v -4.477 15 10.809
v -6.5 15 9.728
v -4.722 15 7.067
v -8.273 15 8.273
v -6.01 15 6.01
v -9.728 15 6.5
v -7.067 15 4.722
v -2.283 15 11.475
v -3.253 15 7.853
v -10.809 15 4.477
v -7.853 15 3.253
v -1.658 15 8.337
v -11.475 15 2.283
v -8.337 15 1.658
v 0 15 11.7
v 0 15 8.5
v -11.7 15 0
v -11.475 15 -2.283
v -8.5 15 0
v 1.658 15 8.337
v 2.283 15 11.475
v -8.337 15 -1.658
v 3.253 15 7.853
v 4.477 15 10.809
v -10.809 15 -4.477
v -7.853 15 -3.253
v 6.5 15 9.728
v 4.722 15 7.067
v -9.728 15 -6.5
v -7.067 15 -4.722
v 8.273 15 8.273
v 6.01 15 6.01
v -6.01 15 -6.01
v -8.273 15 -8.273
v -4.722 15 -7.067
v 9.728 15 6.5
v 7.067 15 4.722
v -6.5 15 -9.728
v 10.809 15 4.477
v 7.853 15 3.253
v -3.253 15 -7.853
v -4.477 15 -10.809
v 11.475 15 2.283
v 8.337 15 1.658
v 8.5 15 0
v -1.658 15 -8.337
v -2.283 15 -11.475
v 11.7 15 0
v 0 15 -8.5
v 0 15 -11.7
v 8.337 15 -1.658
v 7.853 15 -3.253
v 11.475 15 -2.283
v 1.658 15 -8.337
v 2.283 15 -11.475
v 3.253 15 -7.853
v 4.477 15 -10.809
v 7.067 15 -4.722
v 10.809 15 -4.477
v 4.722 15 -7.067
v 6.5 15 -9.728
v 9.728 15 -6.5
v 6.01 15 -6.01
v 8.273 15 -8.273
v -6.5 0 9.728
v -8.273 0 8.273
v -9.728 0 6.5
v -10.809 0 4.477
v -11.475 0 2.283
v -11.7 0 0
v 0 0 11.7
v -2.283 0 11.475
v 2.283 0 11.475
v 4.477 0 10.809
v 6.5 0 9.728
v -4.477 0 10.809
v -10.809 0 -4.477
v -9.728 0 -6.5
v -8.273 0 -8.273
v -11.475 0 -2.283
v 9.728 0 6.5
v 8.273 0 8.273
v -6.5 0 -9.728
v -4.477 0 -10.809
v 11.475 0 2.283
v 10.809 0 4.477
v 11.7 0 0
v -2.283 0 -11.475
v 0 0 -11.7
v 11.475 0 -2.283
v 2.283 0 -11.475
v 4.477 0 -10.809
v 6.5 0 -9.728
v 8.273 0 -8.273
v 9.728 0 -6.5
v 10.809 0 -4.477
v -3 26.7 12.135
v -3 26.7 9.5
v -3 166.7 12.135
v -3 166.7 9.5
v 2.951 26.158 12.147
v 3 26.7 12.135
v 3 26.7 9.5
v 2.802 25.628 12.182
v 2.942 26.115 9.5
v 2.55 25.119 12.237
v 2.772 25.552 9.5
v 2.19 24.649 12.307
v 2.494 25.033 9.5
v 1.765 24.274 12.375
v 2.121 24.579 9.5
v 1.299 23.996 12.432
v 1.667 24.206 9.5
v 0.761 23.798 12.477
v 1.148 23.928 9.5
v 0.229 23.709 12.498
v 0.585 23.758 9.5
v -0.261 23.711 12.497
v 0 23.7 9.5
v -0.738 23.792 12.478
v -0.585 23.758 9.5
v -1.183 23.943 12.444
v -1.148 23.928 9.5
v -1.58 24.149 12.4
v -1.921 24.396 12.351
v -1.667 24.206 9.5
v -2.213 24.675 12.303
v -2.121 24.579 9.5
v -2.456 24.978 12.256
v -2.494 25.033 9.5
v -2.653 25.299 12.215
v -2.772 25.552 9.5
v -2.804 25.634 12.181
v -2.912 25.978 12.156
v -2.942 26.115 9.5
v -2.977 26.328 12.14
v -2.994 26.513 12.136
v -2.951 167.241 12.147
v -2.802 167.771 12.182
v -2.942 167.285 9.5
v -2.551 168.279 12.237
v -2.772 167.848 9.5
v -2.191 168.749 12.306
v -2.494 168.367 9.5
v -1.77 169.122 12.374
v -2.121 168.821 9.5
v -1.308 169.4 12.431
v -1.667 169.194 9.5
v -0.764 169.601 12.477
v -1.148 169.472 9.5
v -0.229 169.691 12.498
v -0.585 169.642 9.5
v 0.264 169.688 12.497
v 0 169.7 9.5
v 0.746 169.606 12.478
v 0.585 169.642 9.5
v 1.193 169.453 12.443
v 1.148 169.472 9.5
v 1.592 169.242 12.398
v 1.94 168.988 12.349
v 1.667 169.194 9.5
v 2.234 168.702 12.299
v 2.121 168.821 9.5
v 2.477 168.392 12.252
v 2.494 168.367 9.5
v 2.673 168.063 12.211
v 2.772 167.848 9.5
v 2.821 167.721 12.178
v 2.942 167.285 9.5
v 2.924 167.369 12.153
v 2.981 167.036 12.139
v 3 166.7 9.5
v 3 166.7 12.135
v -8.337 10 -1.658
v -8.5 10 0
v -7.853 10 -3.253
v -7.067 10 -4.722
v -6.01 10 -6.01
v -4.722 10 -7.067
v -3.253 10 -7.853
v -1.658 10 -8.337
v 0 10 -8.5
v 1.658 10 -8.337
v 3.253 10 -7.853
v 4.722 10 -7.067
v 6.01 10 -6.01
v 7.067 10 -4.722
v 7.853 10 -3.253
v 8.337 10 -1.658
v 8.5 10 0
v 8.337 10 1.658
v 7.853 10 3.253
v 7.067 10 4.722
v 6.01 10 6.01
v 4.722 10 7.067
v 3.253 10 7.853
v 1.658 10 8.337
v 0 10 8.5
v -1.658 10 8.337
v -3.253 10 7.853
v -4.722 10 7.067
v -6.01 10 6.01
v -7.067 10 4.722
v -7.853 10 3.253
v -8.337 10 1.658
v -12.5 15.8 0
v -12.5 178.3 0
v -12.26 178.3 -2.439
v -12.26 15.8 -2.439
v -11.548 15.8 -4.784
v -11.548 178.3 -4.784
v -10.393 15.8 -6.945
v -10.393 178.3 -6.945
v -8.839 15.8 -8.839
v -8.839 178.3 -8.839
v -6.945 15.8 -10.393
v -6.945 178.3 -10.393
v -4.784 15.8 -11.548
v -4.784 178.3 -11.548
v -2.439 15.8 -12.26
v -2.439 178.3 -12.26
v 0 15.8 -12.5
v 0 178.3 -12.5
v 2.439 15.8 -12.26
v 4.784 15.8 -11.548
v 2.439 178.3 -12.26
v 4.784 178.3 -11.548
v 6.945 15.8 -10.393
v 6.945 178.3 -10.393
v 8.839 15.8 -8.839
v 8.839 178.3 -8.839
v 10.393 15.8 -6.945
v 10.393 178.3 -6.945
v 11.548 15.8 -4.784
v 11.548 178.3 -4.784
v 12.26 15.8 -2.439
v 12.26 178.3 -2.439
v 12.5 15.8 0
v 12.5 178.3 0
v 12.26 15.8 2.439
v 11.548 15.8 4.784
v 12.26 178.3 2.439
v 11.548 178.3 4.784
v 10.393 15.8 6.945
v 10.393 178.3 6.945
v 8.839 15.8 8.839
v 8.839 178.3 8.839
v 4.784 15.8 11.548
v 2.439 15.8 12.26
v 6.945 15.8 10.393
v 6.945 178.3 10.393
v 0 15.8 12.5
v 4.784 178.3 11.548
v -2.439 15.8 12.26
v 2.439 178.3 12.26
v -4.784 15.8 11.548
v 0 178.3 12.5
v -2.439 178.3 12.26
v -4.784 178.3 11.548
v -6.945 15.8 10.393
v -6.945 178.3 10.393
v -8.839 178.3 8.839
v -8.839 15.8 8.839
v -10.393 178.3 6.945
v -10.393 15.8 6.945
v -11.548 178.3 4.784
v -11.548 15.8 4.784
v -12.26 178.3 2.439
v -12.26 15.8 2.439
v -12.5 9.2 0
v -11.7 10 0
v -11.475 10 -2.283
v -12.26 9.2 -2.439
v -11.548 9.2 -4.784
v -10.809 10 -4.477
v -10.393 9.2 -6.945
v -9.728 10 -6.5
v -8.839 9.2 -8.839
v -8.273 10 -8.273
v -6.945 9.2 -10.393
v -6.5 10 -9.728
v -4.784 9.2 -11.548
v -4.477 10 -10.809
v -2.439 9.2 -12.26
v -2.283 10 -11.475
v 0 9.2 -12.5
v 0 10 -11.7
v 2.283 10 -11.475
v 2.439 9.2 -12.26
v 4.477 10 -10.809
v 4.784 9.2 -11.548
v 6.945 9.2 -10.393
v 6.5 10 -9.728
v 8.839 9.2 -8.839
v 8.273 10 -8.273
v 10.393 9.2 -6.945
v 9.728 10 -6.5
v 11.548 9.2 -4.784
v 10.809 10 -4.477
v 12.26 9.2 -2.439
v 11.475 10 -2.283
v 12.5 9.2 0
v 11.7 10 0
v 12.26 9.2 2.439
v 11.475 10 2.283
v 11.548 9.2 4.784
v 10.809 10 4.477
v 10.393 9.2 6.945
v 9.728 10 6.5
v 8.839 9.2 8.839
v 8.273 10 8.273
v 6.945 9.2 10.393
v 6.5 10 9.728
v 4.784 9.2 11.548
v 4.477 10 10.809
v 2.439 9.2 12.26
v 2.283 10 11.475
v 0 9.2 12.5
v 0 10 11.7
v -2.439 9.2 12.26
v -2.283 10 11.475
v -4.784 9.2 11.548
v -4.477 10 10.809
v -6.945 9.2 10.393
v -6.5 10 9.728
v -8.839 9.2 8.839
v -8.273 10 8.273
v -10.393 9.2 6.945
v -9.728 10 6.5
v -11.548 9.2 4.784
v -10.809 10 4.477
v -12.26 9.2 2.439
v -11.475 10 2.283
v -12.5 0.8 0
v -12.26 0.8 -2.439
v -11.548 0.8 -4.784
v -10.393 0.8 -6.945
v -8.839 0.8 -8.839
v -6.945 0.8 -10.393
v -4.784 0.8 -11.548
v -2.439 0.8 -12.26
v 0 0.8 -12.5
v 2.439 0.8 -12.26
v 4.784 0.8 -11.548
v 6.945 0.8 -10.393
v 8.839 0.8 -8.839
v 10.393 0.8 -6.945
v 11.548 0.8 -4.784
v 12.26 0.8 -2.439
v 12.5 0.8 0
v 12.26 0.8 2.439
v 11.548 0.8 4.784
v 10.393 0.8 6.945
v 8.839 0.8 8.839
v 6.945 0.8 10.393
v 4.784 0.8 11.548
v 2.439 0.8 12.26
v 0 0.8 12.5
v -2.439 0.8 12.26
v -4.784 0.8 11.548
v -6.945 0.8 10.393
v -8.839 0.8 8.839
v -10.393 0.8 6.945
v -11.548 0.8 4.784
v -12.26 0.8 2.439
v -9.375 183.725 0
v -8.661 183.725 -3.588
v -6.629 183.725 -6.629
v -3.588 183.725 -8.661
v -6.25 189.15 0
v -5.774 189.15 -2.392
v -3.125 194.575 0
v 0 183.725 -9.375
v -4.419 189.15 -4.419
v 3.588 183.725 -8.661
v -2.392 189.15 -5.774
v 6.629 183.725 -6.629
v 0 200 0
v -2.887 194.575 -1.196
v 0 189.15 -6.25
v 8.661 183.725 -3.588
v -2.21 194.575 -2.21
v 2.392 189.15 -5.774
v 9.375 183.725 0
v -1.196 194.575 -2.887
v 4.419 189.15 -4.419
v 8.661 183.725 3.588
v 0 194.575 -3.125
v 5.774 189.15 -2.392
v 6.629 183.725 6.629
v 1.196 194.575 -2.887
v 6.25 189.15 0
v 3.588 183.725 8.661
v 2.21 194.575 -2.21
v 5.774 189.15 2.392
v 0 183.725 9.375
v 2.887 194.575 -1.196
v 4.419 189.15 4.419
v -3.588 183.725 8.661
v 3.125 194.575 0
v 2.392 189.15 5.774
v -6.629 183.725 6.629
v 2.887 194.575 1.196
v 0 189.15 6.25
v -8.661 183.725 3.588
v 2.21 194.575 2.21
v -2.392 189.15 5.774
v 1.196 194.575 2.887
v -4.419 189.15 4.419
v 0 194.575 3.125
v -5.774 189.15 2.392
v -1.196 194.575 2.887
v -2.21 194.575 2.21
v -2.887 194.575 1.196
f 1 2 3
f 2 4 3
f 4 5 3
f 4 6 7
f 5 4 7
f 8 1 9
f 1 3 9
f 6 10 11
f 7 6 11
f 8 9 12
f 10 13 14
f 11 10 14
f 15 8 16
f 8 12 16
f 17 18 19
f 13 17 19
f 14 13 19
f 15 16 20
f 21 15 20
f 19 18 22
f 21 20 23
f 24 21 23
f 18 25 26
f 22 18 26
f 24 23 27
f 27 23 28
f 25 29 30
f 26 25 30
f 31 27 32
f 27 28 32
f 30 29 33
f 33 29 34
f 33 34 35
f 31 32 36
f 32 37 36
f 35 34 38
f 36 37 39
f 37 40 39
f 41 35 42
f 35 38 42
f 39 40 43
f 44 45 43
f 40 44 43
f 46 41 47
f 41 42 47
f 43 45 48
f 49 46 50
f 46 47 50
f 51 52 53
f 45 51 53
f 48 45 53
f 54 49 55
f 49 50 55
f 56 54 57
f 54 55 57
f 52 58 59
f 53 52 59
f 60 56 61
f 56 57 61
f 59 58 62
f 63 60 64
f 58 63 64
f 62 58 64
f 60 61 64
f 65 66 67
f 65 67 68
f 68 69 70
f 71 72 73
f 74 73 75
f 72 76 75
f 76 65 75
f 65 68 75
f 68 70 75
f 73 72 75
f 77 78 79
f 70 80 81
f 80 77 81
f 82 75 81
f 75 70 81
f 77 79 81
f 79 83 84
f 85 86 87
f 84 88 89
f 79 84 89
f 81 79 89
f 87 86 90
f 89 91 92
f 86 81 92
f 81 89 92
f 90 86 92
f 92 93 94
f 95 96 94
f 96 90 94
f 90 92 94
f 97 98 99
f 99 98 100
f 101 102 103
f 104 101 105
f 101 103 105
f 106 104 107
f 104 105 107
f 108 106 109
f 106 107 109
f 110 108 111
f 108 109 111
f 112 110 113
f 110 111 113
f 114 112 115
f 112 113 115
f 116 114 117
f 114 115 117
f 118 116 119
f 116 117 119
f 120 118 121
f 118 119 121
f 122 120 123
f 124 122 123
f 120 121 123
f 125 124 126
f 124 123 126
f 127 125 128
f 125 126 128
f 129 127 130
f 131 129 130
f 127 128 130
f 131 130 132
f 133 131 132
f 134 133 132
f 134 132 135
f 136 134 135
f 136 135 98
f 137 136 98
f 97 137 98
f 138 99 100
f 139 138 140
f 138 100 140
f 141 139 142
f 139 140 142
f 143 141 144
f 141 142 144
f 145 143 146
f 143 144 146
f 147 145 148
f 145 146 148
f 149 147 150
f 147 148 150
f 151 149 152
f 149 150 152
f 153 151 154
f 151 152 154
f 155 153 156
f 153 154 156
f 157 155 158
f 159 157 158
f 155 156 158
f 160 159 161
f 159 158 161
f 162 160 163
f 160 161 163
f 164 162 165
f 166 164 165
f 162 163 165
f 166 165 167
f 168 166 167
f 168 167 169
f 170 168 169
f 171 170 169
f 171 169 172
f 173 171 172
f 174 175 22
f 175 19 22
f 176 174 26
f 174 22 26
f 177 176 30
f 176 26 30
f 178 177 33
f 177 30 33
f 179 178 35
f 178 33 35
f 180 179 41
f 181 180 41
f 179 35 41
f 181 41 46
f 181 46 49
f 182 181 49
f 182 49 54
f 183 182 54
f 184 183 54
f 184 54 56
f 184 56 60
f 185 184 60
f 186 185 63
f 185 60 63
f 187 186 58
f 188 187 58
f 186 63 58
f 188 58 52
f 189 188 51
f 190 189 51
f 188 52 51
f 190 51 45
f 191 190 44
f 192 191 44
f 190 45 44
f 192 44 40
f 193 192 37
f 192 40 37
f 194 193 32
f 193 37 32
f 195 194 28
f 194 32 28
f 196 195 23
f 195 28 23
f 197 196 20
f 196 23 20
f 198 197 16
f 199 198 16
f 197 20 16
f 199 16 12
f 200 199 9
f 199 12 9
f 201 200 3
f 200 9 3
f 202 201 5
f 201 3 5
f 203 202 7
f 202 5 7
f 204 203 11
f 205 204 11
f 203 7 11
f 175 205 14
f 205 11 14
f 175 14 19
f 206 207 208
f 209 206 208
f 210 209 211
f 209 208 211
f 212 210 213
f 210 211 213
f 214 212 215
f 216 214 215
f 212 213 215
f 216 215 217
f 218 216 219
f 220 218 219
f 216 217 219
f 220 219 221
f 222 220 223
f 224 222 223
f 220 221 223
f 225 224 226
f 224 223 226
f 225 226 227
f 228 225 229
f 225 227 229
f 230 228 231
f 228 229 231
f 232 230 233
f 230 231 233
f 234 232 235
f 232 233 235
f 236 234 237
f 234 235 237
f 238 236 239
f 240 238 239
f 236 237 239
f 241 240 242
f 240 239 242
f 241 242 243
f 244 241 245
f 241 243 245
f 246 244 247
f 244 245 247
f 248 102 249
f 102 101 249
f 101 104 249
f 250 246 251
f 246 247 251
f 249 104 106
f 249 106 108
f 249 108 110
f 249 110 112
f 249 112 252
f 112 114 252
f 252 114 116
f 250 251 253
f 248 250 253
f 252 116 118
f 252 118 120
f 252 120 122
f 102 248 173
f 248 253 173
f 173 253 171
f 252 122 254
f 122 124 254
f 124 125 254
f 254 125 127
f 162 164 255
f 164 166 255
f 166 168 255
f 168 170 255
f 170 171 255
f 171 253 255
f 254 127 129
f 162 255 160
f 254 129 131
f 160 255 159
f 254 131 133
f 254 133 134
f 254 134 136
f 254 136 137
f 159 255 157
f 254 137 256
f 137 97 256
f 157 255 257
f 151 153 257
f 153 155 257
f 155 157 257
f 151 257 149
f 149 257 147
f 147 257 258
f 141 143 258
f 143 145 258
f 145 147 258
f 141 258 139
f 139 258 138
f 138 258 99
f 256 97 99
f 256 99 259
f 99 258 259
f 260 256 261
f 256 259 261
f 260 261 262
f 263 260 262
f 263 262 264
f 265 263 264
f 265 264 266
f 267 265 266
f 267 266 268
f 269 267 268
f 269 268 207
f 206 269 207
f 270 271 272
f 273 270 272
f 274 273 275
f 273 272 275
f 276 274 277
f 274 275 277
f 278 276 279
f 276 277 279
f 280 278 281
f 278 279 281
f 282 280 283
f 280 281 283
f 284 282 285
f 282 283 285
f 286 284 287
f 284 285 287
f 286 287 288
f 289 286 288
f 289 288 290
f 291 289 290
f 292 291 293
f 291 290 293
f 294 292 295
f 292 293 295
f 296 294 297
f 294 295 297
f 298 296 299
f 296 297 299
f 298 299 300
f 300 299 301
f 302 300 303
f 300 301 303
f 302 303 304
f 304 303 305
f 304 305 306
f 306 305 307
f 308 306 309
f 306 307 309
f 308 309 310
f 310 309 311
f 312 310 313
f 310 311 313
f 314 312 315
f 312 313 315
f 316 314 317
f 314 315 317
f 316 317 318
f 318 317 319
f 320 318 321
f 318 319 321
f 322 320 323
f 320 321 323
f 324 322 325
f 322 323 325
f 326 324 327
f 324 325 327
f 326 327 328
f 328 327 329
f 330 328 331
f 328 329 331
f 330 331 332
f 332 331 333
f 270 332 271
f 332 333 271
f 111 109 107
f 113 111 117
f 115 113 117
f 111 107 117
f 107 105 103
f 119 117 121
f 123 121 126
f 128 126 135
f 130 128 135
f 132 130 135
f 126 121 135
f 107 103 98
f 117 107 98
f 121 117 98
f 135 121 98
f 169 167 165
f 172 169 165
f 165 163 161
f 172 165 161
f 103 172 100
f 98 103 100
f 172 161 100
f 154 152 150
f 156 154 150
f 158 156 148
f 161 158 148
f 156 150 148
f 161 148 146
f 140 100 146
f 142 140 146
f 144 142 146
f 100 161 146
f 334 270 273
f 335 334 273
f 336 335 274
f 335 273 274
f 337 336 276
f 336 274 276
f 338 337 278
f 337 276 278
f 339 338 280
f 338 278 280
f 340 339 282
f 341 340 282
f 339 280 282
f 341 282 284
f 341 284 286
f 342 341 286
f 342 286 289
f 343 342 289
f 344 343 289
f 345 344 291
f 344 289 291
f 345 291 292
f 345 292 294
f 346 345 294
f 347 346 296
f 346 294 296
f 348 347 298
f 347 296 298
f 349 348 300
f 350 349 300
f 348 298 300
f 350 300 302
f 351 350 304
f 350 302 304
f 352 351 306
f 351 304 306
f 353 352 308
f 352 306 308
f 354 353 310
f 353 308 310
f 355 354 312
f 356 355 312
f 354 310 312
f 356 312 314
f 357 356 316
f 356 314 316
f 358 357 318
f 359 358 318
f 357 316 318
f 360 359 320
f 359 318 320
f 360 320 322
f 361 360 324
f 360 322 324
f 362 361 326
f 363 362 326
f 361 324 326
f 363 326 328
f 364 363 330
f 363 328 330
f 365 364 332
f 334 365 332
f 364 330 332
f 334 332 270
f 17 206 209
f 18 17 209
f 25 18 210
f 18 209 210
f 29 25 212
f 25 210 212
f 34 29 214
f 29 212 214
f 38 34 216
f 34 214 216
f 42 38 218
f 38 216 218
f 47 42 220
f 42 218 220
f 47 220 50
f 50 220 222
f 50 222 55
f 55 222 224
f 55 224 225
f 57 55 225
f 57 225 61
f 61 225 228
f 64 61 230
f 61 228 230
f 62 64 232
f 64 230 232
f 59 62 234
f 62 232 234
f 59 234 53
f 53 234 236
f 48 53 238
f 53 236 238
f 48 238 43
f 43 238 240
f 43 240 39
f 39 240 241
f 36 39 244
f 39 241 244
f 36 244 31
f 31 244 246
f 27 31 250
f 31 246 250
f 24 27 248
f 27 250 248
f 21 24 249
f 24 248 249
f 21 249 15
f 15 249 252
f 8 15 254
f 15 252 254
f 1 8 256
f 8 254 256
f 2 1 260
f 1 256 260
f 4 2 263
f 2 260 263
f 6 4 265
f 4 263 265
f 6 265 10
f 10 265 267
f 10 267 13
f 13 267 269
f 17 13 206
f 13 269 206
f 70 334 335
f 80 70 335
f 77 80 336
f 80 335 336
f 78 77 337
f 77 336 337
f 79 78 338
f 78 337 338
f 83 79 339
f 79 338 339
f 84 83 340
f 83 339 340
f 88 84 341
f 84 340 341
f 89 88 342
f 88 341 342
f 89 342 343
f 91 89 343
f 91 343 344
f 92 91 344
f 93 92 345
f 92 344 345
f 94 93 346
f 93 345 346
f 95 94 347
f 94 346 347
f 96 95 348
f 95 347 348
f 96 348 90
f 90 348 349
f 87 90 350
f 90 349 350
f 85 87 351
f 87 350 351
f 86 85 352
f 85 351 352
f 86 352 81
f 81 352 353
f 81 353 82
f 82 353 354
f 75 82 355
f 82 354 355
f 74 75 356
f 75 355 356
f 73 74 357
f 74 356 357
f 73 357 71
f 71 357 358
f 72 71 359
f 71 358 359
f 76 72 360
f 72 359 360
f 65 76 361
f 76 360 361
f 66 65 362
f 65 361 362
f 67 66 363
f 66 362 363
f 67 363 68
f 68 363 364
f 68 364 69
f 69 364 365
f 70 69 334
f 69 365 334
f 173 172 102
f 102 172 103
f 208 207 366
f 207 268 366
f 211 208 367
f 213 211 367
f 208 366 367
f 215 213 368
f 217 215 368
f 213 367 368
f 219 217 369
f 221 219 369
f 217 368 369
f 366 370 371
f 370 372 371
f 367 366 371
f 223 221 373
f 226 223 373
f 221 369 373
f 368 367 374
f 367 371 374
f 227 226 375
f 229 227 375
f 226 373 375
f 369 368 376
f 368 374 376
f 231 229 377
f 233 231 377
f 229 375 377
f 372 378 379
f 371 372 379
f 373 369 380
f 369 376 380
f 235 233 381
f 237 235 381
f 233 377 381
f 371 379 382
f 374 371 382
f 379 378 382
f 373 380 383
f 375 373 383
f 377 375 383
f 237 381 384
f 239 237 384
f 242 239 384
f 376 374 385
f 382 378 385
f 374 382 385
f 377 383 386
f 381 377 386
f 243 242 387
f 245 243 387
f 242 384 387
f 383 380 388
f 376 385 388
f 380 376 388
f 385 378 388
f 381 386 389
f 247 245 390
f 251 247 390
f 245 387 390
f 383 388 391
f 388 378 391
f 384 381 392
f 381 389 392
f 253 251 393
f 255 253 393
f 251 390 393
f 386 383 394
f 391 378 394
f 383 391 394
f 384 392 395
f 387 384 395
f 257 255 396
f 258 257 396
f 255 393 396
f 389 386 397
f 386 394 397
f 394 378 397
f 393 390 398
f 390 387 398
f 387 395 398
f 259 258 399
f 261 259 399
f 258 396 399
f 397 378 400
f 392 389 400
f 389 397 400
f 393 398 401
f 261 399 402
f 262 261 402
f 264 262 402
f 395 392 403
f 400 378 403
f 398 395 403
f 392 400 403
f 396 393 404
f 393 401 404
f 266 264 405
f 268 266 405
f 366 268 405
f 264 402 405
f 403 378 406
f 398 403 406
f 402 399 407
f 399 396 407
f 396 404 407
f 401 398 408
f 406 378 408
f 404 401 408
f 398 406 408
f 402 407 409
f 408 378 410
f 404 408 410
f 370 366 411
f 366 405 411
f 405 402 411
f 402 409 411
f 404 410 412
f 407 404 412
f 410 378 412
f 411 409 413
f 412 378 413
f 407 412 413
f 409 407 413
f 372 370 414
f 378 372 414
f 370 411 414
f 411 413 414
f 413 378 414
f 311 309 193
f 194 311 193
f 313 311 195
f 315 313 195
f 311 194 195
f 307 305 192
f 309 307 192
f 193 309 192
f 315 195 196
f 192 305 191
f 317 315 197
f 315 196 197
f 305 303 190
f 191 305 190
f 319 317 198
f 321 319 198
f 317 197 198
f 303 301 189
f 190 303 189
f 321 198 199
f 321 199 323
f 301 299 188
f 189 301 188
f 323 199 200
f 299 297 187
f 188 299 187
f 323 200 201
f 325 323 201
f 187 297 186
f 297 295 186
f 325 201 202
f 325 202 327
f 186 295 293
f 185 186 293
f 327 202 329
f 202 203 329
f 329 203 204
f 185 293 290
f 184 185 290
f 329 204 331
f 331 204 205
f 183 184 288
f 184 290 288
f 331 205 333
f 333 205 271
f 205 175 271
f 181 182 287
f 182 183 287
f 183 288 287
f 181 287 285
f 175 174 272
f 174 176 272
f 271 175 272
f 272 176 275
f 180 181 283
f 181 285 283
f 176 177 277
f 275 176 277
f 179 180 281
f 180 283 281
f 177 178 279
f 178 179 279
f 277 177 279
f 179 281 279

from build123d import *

# Parameters (mm, degrees)
CORTAR_EXTRUIR1_START = 9.5
CORTAR_EXTRUIR1_DEPTH = 7
CHAFL_N1_SIZE         = 0.8


with BuildPart() as part:
    # Croquis2 → Revolución1 (revolve)
    with BuildSketch(Plane.XY):
        Polygon((0, 0), (-12.5, 0), (-12.5, 10), (-8.5, 10), (-8.5, 15), (-12.5, 15), (-12.5, 178.3), (0, 200), align=None)
    revolve(axis=Axis((0, 200, 0), (0, -1, 0)))

    # Croquis3 → Cortar-Extruir1 (cut)
    with BuildSketch(Plane.XY.offset(CORTAR_EXTRUIR1_START)):
        with BuildLine():
            Line((3, 166.7), (3, 26.7))
            ThreePointArc((3, 26.7), (0, 23.7), (-3, 26.7))
            Line((-3, 26.7), (-3, 166.7))
            ThreePointArc((-3, 166.7), (0, 169.7), (3, 166.7))
        make_face()
    extrude(amount=CORTAR_EXTRUIR1_DEPTH, mode=Mode.SUBTRACT)

    # Chaflán1
    chafl_n1_edges = [part.edges().sort_by_distance(p)[0] for p in [
        (12.5, 15, 0),
        (12.5, 10, 0),
        (12.5, 0, 0),
    ]]
    chamfer(chafl_n1_edges, length=CHAFL_N1_SIZE)


solid = part.part
